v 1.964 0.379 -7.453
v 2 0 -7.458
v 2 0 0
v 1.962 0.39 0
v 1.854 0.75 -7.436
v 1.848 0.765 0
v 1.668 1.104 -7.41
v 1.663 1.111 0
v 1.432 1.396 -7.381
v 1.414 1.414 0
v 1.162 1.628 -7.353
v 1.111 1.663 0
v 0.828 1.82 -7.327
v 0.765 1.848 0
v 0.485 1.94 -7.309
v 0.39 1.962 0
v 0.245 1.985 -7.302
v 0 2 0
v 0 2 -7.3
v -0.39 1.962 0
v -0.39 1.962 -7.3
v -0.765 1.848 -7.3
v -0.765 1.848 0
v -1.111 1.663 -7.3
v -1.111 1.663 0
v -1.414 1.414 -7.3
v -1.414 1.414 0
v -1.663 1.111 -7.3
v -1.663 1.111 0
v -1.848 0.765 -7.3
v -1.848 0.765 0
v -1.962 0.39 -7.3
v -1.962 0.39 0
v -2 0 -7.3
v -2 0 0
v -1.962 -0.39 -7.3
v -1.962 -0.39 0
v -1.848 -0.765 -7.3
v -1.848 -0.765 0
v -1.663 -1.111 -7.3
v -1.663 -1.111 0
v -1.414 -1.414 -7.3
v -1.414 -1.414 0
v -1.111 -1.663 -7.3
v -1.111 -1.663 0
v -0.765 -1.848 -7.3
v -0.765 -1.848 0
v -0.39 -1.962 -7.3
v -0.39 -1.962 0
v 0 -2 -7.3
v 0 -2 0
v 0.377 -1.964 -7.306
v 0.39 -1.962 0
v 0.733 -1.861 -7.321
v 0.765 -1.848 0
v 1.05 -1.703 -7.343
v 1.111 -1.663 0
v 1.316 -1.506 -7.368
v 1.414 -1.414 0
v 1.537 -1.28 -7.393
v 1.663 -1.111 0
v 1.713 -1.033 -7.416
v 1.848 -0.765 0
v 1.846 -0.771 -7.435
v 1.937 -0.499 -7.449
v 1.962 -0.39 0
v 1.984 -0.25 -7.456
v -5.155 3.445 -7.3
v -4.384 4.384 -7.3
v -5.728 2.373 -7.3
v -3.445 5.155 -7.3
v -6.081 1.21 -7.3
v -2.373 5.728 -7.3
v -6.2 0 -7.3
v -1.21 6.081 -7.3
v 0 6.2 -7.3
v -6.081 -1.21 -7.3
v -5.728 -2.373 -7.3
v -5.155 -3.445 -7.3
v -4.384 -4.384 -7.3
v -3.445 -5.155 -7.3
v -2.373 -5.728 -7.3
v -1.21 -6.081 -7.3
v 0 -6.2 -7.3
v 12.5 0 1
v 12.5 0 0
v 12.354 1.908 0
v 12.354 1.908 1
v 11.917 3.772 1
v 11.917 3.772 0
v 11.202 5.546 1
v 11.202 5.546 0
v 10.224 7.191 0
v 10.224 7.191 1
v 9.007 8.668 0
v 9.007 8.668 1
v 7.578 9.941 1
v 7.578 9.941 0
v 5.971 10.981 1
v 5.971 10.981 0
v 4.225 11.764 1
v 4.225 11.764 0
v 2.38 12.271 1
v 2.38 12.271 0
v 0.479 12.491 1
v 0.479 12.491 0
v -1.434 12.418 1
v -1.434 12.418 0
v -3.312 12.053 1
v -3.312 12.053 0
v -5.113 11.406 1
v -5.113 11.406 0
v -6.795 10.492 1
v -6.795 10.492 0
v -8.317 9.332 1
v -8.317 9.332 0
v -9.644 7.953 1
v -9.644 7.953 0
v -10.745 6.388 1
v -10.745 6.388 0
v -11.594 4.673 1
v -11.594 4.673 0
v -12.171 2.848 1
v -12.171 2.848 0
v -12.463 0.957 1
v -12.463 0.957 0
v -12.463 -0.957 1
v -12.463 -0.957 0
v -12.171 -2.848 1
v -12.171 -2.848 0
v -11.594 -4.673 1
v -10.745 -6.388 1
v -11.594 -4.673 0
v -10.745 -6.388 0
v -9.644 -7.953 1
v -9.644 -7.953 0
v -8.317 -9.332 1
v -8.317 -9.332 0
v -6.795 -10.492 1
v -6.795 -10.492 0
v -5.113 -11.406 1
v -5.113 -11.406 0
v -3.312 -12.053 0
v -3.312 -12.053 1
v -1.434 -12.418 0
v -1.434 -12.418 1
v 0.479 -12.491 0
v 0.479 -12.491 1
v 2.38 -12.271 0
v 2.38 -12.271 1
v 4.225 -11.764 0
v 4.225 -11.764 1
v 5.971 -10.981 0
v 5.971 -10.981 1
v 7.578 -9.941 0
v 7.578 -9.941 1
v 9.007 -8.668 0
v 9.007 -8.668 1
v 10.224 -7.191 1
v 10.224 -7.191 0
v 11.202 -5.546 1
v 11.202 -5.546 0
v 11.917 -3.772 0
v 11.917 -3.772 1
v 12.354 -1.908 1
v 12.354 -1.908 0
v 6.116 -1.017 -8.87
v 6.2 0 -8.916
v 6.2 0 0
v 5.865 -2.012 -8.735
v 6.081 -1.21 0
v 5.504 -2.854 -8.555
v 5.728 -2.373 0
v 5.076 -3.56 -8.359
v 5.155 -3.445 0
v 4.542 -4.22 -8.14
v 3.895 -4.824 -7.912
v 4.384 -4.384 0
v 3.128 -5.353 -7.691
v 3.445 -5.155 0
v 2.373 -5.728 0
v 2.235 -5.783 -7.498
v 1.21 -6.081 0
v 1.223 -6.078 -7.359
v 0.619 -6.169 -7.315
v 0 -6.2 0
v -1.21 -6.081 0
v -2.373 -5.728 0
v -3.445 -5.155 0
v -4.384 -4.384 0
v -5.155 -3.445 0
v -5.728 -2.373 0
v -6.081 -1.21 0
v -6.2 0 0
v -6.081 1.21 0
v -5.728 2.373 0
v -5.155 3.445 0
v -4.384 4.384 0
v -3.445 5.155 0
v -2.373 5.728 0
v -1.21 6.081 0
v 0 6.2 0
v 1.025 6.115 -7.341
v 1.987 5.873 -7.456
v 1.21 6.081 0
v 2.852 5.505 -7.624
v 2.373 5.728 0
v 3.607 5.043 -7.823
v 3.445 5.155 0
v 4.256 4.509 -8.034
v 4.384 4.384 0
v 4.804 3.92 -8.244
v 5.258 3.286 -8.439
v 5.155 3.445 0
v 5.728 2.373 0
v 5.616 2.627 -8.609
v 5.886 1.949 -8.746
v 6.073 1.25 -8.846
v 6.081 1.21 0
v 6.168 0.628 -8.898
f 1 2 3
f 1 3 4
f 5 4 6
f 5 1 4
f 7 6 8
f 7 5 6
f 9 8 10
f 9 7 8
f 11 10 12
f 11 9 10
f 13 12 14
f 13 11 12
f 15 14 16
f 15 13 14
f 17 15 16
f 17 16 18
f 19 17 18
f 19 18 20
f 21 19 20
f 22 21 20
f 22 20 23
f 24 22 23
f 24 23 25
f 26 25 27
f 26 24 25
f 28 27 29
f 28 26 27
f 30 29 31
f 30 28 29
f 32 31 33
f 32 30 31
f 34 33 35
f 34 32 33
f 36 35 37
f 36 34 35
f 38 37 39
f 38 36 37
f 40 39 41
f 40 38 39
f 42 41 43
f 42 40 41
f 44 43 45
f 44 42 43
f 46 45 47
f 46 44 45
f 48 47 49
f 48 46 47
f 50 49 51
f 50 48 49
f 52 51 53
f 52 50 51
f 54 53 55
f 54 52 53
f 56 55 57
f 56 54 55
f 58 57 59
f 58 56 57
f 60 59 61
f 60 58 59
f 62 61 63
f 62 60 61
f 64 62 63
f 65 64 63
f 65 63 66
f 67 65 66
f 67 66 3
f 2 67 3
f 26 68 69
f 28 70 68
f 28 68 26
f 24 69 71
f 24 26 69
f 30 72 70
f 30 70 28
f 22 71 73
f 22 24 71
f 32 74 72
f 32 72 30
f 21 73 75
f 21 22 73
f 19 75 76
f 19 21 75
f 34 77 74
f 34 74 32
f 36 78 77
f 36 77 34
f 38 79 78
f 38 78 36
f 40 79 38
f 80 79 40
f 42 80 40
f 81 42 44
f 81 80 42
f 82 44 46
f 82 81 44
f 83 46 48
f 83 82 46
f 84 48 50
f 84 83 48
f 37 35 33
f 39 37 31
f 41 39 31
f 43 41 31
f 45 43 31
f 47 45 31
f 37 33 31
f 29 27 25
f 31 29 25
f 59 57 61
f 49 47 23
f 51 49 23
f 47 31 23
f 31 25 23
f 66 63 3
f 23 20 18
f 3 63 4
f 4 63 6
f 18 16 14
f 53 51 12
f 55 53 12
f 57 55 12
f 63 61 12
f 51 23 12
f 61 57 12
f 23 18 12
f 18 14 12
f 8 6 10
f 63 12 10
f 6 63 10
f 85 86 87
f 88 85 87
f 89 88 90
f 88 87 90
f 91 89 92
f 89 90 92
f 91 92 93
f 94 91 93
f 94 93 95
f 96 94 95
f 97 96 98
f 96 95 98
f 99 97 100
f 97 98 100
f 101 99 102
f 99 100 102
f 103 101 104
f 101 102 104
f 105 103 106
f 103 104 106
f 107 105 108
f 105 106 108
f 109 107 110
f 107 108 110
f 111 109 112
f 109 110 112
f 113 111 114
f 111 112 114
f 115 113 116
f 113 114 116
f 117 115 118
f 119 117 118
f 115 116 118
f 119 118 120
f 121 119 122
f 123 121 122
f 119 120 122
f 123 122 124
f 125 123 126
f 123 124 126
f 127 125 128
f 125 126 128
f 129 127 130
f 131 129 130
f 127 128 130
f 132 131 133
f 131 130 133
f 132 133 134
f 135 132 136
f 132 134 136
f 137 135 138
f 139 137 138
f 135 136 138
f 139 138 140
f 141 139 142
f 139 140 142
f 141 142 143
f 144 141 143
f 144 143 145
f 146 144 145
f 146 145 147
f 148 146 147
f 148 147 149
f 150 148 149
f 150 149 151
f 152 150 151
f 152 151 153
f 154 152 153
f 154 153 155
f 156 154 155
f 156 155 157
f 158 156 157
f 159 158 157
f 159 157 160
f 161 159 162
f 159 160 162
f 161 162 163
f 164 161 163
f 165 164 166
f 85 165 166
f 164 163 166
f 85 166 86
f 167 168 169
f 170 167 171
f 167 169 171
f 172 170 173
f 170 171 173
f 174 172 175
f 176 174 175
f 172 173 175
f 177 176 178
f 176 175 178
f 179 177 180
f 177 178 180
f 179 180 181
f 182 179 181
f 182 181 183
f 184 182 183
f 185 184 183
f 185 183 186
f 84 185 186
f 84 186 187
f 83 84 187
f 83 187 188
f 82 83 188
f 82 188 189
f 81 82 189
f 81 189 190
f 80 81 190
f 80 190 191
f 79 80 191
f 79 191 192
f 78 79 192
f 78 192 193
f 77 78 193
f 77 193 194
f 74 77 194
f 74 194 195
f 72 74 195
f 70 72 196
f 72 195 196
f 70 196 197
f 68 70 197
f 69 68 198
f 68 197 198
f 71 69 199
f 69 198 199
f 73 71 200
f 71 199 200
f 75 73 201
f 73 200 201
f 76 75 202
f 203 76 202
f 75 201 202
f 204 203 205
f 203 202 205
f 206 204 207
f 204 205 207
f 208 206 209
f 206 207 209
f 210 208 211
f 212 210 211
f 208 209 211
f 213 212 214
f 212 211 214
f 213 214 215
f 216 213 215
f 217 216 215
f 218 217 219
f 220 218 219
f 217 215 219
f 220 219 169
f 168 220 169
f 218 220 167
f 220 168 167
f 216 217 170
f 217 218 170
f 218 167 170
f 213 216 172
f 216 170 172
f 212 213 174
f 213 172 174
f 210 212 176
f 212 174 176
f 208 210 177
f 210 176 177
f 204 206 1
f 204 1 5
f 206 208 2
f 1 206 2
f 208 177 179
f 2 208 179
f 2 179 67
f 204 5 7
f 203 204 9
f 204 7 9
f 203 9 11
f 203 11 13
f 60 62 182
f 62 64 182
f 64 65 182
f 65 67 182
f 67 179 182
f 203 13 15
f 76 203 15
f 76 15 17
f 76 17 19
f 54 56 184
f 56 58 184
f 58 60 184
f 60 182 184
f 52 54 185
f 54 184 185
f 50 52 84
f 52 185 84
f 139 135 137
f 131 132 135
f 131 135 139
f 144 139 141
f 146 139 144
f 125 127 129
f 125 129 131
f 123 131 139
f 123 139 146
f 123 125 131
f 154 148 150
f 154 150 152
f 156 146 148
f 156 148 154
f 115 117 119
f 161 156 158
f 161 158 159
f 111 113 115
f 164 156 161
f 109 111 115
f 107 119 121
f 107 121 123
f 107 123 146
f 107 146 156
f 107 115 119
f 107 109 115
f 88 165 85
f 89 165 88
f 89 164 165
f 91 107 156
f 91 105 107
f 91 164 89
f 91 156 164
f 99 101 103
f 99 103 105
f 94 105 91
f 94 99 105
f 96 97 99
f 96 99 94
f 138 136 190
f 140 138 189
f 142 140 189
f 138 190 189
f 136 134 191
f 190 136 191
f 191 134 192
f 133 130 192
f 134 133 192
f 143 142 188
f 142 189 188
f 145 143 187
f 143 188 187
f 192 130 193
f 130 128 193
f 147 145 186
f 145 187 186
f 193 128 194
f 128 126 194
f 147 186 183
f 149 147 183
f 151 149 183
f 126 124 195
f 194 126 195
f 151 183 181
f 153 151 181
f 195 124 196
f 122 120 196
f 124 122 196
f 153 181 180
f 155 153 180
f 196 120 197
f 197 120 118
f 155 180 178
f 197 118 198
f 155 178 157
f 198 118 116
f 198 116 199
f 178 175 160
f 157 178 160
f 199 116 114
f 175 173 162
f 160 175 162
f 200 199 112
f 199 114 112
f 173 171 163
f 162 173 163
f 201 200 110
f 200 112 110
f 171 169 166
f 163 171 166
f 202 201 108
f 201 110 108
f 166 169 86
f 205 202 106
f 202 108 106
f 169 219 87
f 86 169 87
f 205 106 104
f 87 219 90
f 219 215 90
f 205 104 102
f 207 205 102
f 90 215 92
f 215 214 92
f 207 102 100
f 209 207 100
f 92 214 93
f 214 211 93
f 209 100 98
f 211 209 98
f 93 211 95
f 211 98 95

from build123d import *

# Parameters (mm, degrees)
F0_R           = 12.5
F1_DEPTH       = 1
F2_R           = 6.2
F3_DEPTH       = 10
F4_R           = 12.7
F5_DEPTH       = 25
F5_DEPTH_BACK  = 25
F7_R           = 2
F8_DEPTH       = 10
F9_W           = 9.563760832
F9_H           = 3.8901750788
F10_DEPTH      = 12.501
F10_DEPTH_BACK = 12.501


with BuildPart() as f1:
    # F0 (on Top) → F1 (new body)
    with BuildSketch(Plane.XY):
        Circle(F0_R)
    extrude(amount=F1_DEPTH)

    # F2 (on face) → F3 (join)
    with BuildSketch(Plane(origin=(0, 0, 0), x_dir=(1, 0, 0), z_dir=(0, 0, -1))):
        Circle(F2_R)
    extrude(amount=F3_DEPTH)

    # F4 (on Front) → F5 (cut, two sides)
    with BuildSketch(Plane.XZ) as f5_sk:
        with Locations((0, -20)):
            Circle(F4_R)
    extrude(amount=-F5_DEPTH, mode=Mode.SUBTRACT)
    extrude(f5_sk.sketch, amount=F5_DEPTH_BACK, mode=Mode.SUBTRACT)

    # F7 (on offset) → F8 (cut, through all)
    with BuildSketch(Plane.XY.offset(-10)):
        Circle(F7_R)
    extrude(amount=F8_DEPTH, mode=Mode.SUBTRACT)

    # F9 (on Front) → F10 (cut, two sides)
    with BuildSketch(Plane.XZ) as f10_sk:
        with Locations((-4.781880416, -9.2450875394)):
            Rectangle(F9_W, F9_H)
    extrude(amount=-F10_DEPTH, mode=Mode.SUBTRACT)
    extrude(f10_sk.sketch, amount=F10_DEPTH_BACK, mode=Mode.SUBTRACT)


solid = f1.part
